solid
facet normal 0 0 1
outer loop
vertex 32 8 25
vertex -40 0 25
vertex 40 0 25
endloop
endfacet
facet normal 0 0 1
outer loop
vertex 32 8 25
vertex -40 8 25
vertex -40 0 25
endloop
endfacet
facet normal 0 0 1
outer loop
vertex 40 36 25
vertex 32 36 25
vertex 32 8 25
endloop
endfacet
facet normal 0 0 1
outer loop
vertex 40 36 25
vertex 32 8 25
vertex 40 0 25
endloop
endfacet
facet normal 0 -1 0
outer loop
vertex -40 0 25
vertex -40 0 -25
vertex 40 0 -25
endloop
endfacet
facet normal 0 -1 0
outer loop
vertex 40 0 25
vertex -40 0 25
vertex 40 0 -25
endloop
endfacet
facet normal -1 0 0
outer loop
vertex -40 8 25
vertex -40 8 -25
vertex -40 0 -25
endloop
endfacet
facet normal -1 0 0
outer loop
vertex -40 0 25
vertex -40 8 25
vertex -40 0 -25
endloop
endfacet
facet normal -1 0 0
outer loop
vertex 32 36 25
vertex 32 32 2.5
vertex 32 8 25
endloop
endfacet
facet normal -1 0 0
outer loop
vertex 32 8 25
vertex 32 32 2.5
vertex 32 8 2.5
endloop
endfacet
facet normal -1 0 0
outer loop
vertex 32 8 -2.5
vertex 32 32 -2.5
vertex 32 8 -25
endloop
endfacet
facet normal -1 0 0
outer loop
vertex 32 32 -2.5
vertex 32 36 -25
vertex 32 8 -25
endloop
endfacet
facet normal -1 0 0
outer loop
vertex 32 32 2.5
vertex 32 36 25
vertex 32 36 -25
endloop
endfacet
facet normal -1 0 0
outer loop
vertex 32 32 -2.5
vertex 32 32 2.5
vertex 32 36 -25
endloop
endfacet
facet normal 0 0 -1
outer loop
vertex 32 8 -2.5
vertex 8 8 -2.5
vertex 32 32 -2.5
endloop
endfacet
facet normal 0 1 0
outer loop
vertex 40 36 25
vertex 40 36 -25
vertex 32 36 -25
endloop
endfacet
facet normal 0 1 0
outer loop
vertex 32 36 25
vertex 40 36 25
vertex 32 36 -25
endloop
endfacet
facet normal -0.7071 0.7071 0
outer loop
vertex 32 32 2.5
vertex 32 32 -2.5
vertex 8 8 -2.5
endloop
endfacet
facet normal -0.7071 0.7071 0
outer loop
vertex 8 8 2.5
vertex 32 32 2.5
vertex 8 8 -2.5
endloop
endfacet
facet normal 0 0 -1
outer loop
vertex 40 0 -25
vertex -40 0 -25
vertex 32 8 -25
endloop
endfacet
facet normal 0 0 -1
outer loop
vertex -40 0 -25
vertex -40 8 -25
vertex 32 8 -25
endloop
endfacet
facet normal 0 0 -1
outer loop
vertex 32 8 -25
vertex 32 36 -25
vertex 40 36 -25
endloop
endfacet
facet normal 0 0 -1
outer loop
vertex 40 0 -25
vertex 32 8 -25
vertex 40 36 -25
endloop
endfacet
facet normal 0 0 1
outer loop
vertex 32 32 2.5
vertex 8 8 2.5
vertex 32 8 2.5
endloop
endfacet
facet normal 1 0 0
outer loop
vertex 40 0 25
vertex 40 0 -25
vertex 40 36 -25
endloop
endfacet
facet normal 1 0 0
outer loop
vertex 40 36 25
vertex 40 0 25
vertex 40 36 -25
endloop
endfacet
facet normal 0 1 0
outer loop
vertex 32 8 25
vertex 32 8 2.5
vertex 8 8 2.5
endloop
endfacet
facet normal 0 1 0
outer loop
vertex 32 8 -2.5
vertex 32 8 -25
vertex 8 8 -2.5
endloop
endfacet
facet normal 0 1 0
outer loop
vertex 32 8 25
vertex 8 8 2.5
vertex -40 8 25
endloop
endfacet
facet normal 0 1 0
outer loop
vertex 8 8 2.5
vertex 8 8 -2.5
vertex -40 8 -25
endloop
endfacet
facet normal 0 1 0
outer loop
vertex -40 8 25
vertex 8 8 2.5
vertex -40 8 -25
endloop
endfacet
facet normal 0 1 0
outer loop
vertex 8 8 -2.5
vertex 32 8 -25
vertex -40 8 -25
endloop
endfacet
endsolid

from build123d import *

# Parameters (mm, degrees)
EXTRUDE_1_DEPTH = 50
EXTRUDE_START   = -2.5
EXTRUDE_2_DEPTH = 5


# Read off the part's stored shape, not the designer's step: 凸台-拉伸2
with BuildPart() as part:
    # 草图1 → 凸台-拉伸1 (new body)
    with BuildSketch(Plane.XY.offset(-25)):
        Polygon((-40, 0), (40, 0), (40, 36), (32, 36), (32, 8), (-40, 8), align=None)
    extrude(amount=EXTRUDE_1_DEPTH)

    # 凸台-拉伸2 outline → 凸台-拉伸2 (add)
    with BuildSketch(Plane.XY.offset(EXTRUDE_START)):
        Polygon((32, 32), (8, 8), (32, 8), align=None)
    extrude(amount=EXTRUDE_2_DEPTH)


solid = part.part
